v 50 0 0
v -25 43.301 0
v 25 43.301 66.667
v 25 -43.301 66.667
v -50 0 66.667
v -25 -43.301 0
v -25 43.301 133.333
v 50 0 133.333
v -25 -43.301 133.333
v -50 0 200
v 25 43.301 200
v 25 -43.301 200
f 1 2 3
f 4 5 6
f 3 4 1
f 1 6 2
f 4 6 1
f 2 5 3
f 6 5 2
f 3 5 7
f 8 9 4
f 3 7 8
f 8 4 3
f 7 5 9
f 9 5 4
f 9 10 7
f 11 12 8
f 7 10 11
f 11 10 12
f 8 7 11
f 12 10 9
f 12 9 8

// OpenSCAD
//Octaedron Generator by David_LG 03/02/2017
// this isn't a precise model, but it seems ok for 3D printing purposes

Diameter=100; // Diameter of the circumbscribed circle
Total_Height=200; // Total Heigth
Number_of_octaedrons=3; // Total number of octaedrons to pile up

Height=Total_Height/Number_of_octaedrons;

for(i=[0:Number_of_octaedrons-1]){
    rotate([0,0,60*i])translate([0,0,Height*i])hull(){
        cylinder(r=Diameter/2,h=.0001, $fn=3); 
        rotate([0,0,60])translate([0,0,Height])cylinder(r=Diameter/2,h=.0001, $fn=3); 
    }
}
